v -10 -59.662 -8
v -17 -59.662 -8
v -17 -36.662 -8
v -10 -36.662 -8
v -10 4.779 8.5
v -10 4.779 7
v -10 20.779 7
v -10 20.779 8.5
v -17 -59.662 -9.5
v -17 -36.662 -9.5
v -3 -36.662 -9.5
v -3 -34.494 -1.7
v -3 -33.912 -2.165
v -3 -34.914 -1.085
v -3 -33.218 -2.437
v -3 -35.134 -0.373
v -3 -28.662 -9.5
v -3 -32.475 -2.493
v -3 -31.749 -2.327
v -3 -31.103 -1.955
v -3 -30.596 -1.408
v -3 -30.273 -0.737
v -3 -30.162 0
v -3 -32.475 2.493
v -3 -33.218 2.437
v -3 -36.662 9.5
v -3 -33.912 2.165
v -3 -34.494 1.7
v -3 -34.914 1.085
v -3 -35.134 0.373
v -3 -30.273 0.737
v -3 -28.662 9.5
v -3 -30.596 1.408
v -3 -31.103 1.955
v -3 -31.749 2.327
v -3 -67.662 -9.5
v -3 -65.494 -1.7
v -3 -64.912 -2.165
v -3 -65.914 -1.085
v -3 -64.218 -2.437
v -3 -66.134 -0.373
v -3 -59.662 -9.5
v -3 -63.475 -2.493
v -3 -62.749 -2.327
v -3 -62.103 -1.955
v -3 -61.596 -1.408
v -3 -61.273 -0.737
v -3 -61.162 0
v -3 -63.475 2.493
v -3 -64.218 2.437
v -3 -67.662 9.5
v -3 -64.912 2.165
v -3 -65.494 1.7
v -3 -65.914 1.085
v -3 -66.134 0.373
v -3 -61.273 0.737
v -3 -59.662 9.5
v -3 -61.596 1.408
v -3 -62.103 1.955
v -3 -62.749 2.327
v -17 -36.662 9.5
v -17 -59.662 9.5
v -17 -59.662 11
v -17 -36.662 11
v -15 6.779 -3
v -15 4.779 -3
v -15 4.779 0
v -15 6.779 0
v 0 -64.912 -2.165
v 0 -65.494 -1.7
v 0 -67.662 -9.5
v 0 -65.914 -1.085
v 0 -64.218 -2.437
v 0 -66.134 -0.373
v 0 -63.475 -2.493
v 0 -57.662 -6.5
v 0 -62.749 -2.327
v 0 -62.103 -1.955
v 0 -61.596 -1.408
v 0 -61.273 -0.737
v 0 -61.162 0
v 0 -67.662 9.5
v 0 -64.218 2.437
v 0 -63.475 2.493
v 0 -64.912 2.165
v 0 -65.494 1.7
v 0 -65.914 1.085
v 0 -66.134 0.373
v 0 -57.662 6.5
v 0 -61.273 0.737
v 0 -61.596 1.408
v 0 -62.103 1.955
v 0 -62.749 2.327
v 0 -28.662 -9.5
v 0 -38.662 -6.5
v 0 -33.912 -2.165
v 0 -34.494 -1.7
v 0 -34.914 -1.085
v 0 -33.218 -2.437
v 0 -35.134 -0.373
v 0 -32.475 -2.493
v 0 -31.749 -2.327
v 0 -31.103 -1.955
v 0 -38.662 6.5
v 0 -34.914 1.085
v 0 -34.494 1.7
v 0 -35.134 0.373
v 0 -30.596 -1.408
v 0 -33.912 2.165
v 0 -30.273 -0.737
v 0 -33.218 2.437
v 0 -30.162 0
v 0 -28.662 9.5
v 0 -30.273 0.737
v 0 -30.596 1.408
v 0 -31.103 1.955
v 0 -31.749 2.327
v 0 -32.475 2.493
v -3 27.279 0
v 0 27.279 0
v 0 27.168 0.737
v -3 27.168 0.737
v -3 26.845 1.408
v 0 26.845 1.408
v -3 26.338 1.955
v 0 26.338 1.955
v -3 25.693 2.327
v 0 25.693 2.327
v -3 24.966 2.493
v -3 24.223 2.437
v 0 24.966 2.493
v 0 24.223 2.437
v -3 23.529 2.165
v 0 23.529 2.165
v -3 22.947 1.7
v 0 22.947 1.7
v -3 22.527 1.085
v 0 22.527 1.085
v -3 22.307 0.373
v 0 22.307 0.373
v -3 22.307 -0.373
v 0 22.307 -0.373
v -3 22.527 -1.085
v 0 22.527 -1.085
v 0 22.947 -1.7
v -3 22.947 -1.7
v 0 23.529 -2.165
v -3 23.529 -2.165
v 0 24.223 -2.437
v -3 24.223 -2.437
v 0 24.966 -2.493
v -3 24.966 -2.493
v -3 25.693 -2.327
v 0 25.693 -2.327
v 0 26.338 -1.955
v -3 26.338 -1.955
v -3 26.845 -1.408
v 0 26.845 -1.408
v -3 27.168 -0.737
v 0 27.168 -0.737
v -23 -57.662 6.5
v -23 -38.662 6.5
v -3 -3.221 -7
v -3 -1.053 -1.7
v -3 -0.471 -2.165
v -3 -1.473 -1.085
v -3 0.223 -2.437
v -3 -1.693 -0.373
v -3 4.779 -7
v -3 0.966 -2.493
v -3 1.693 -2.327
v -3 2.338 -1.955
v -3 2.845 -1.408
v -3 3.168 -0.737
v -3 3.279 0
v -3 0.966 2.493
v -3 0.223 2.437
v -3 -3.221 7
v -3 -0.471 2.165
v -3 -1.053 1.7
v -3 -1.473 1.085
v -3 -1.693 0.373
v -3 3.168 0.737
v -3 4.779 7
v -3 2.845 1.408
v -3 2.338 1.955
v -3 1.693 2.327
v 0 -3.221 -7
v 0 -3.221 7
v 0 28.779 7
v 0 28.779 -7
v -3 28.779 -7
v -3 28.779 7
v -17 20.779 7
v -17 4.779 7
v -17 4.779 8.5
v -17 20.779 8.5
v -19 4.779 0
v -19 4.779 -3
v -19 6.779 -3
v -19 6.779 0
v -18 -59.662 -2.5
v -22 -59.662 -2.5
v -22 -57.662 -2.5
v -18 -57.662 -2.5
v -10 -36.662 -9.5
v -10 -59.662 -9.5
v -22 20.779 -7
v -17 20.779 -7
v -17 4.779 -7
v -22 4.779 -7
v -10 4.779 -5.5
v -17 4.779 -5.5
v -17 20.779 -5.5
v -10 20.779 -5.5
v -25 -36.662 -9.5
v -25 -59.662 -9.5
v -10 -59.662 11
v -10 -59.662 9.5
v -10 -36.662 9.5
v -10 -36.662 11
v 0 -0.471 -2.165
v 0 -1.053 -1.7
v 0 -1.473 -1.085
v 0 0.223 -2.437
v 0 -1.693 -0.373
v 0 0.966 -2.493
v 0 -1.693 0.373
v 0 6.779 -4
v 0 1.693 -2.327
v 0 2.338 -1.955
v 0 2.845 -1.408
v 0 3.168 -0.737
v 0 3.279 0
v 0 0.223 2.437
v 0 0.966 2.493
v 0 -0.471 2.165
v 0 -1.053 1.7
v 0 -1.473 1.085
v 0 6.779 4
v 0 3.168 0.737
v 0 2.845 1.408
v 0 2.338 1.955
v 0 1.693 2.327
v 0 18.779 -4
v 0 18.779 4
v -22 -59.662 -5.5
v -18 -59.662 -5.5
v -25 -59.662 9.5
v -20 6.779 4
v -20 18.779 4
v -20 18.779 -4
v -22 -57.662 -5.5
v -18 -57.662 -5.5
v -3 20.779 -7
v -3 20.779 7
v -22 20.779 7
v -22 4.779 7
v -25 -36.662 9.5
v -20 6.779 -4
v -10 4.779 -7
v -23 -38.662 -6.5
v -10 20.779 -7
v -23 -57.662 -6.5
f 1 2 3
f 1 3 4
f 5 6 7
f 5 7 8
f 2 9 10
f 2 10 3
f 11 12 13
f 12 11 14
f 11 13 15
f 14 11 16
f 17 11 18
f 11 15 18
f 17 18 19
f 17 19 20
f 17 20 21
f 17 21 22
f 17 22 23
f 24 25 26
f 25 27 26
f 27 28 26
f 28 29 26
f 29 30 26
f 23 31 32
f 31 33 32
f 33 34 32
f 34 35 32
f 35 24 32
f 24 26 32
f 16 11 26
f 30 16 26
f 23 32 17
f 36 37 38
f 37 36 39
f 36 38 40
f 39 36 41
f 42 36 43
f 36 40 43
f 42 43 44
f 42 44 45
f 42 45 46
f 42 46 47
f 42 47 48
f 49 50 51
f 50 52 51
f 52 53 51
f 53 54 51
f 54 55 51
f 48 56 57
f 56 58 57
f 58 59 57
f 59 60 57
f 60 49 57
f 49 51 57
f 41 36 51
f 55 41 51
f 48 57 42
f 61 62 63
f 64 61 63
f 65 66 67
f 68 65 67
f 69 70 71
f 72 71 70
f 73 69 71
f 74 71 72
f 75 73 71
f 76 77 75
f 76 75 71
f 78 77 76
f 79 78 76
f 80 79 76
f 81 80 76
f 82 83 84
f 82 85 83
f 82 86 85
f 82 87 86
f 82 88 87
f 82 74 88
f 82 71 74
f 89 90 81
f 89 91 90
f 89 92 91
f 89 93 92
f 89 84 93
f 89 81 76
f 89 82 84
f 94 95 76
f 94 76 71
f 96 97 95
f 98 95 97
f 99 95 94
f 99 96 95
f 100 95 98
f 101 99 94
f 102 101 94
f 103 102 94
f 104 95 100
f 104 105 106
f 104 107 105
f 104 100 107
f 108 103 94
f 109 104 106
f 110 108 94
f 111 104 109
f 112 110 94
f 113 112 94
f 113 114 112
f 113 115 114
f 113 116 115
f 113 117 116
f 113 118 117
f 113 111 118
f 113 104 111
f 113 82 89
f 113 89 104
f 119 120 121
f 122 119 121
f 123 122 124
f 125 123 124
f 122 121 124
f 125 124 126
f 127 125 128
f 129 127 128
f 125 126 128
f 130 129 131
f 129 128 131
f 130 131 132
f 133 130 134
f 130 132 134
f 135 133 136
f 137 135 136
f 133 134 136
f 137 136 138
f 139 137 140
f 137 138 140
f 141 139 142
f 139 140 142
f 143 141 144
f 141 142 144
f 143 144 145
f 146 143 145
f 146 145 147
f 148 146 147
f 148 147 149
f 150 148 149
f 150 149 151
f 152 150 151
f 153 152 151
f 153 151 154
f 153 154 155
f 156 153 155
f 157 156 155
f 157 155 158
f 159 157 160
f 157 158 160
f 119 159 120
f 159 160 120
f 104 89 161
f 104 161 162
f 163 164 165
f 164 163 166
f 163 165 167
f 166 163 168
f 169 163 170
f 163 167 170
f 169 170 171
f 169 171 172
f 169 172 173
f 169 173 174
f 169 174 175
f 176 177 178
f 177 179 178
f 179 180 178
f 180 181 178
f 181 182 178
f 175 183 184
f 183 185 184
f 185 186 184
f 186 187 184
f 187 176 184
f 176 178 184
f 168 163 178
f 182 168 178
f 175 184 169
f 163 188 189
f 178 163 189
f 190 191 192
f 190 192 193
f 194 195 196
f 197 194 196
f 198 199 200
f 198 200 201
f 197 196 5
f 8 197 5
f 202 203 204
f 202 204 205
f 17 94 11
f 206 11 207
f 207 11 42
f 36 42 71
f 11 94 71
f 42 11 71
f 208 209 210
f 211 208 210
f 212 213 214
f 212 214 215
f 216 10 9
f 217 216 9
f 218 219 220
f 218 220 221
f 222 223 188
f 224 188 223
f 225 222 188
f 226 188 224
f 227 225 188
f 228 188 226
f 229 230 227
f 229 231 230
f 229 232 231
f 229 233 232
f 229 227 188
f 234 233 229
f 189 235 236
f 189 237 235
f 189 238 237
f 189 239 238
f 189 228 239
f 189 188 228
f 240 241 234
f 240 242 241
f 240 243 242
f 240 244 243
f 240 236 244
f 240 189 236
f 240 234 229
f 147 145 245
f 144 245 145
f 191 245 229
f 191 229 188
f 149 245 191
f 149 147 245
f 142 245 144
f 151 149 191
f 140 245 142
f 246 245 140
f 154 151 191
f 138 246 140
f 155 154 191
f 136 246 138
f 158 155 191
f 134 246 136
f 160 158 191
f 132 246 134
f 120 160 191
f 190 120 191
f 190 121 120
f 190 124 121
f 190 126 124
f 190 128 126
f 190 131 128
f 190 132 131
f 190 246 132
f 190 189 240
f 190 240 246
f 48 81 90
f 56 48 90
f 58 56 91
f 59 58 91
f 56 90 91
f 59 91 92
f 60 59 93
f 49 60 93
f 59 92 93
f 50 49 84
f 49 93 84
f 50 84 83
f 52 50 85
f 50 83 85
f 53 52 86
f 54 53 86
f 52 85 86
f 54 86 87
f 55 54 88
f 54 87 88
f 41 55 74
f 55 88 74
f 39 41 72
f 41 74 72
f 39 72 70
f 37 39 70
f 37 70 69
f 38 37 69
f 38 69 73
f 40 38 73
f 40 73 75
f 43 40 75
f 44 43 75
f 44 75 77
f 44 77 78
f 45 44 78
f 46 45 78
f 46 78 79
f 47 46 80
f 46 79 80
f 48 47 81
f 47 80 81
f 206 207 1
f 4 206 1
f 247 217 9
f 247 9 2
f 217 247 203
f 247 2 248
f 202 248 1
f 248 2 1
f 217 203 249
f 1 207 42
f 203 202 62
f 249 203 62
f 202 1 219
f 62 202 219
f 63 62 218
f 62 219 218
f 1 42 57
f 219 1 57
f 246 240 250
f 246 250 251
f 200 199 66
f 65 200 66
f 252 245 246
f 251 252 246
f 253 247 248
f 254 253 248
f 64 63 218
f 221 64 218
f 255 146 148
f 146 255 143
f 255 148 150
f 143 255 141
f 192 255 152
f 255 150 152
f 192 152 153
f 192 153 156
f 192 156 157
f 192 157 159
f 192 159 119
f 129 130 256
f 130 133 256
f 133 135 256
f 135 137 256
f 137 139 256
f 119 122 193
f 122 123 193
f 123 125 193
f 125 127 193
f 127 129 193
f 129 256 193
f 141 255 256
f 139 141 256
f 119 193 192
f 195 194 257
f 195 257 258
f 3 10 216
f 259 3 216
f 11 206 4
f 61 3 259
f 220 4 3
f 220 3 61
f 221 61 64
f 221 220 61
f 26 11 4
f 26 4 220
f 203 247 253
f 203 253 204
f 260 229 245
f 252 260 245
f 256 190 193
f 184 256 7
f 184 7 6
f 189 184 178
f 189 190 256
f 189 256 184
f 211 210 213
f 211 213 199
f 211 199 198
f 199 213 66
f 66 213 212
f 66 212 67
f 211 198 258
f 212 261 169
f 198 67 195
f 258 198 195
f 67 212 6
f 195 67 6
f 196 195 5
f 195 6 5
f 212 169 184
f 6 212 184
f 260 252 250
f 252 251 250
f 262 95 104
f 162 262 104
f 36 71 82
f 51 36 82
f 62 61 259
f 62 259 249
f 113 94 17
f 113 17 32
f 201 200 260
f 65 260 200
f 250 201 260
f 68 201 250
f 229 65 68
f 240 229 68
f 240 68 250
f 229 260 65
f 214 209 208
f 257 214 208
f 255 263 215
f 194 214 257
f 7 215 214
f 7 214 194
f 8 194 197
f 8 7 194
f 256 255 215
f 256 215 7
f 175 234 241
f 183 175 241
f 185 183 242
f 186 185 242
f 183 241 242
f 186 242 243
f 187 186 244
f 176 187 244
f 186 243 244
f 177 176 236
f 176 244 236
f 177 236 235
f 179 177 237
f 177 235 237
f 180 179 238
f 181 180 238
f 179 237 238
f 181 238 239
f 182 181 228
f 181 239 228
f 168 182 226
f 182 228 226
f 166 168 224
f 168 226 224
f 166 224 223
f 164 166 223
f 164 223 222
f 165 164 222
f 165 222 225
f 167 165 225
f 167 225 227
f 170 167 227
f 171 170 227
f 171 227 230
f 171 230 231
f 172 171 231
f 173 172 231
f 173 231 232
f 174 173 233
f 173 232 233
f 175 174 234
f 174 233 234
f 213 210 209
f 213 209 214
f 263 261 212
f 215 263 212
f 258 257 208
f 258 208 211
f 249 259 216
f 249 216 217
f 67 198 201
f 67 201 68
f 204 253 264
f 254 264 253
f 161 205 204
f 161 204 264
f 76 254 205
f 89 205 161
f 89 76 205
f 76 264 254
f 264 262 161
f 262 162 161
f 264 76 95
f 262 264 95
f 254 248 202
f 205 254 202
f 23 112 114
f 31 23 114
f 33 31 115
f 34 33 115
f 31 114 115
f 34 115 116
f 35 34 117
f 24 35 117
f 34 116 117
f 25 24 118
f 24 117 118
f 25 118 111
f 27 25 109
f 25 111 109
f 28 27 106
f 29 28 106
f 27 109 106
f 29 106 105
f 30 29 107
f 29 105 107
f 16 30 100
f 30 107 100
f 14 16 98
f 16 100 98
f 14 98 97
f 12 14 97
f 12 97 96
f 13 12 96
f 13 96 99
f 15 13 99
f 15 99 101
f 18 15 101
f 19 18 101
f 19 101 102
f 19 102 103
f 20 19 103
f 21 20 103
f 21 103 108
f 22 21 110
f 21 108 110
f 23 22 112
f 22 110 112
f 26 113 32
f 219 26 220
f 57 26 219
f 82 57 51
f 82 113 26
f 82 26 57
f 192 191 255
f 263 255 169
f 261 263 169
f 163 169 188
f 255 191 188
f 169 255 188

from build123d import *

# Parameters (mm, degrees)
F0_W      = 23
F0_H      = 19
F0_W_2    = 19
F0_H_2    = 13
F1_DEPTH  = 23
F0_W_3    = 8
F0_R      = 2.5
F2_DEPTH  = 3
F3_W      = 23
F3_H      = 19
F4_DEPTH  = 2
F5_W      = 4
F5_H      = 3
F6_DEPTH  = 3
F5_W_2    = 7
F5_H_2    = 1.5
F7_DEPTH  = 23
F8_DEPTH  = 23
F0_W_4    = 16
F0_H_3    = 14
F0_W_5    = 12
F0_H_4    = 8
F9_DEPTH  = 20
F10_DEPTH = 3
F11_W     = 16
F11_H     = 14
F12_DEPTH = 2
F13_W     = 4
F13_H     = 3
F14_DEPTH = 3
F13_W_2   = 7
F13_H_2   = 1.5
F15_DEPTH = 16
F16_DEPTH = 16


with BuildPart() as f1:
    # F0 (on Right) → F1 (new body)
    with BuildSketch(Plane.YZ):
        with Locations((-48.1618642807, 0)):
            Rectangle(F0_W, F0_H)
        with Locations((-48.1618642807, 0)):
            Rectangle(F0_W_2, F0_H_2, mode=Mode.SUBTRACT)
    extrude(amount=-F1_DEPTH)

    # F0 (on Right) → F2 (join)
    with BuildSketch(Plane.YZ):
        with Locations((-63.6618642807, 0)):
            Rectangle(F0_W_3, F0_H)
        with Locations((-63.6618642807, 0)):
            Circle(F0_R, mode=Mode.SUBTRACT)
        with Locations((-32.6618642807, 0)):
            Rectangle(F0_W_3, F0_H)
        with Locations((-32.6618642807, 0)):
            Circle(F0_R, mode=Mode.SUBTRACT)
    extrude(amount=-F2_DEPTH)

    # F3 (on face) → F4 (join)
    with BuildSketch(Plane(origin=(-23, 0, 0), x_dir=(0, -1, 0), z_dir=(-1, 0, 0))):
        with Locations((48.1618642807, 0)):
            Rectangle(F3_W, F3_H)
    extrude(amount=F4_DEPTH)

    # F5 (on face) → F6 (cut)
    with BuildSketch(Plane.XZ.offset(59.6618642807)):
        with Locations((-20, -4)):
            Rectangle(F5_W, F5_H)
    extrude(amount=-F6_DEPTH, mode=Mode.SUBTRACT)

    # F5 (on face) → F7 (join)
    with BuildSketch(Plane.XZ.offset(59.6618642807)):
        with Locations((-13.5, 10.25)):
            Rectangle(F5_W_2, F5_H_2)
    extrude(amount=-F7_DEPTH)

    # F5 (on face) → F8 (cut)
    with BuildSketch(Plane.XZ.offset(59.6618642807)):
        with Locations((-13.5, -8.75)):
            Rectangle(F5_W_2, F5_H_2)
    extrude(amount=-F8_DEPTH, mode=Mode.SUBTRACT)


with BuildPart() as f9:
    # F0 (on Right) → F9 (new body)
    with BuildSketch(Plane.YZ):
        with Locations((12.7792228013, 0)):
            Rectangle(F0_W_4, F0_H_3)
        with Locations((12.7792228013, 0)):
            Rectangle(F0_W_5, F0_H_4, mode=Mode.SUBTRACT)
    extrude(amount=-F9_DEPTH)

    # F0 (on Right) → F10 (join)
    with BuildSketch(Plane.YZ):
        with Locations((0.7792228013, 0)):
            Rectangle(F0_W_3, F0_H_3)
        with Locations((0.7792228013, 0)):
            Circle(F0_R, mode=Mode.SUBTRACT)
        with Locations((24.7792228013, 0)):
            Rectangle(F0_W_3, F0_H_3)
        with Locations((24.7792228013, 0)):
            Circle(F0_R, mode=Mode.SUBTRACT)
    extrude(amount=-F10_DEPTH)

    # F11 (on face) → F12 (join)
    with BuildSketch(Plane(origin=(-20, 0, 0), x_dir=(0, -1, 0), z_dir=(-1, 0, 0))):
        with Locations((-12.7792228013, 0)):
            Rectangle(F11_W, F11_H)
    extrude(amount=F12_DEPTH)

    # F13 (on face) → F14 (cut)
    with BuildSketch(Plane.XZ.offset(-4.7792228013)):
        with Locations((-17, -1.5)):
            Rectangle(F13_W, F13_H)
    extrude(amount=-F14_DEPTH, mode=Mode.SUBTRACT)

    # F13 (on face) → F15 (cut)
    with BuildSketch(Plane.XZ.offset(-4.7792228013)):
        with Locations((-13.5, -6.25)):
            Rectangle(F13_W_2, F13_H_2)
    extrude(amount=-F15_DEPTH, mode=Mode.SUBTRACT)

    # F13 (on face) → F16 (join)
    with BuildSketch(Plane.XZ.offset(-4.7792228013)):
        with Locations((-13.5, 7.75)):
            Rectangle(F13_W_2, F13_H_2)
    extrude(amount=-F16_DEPTH)


solid = Compound([f1.part, f9.part])
